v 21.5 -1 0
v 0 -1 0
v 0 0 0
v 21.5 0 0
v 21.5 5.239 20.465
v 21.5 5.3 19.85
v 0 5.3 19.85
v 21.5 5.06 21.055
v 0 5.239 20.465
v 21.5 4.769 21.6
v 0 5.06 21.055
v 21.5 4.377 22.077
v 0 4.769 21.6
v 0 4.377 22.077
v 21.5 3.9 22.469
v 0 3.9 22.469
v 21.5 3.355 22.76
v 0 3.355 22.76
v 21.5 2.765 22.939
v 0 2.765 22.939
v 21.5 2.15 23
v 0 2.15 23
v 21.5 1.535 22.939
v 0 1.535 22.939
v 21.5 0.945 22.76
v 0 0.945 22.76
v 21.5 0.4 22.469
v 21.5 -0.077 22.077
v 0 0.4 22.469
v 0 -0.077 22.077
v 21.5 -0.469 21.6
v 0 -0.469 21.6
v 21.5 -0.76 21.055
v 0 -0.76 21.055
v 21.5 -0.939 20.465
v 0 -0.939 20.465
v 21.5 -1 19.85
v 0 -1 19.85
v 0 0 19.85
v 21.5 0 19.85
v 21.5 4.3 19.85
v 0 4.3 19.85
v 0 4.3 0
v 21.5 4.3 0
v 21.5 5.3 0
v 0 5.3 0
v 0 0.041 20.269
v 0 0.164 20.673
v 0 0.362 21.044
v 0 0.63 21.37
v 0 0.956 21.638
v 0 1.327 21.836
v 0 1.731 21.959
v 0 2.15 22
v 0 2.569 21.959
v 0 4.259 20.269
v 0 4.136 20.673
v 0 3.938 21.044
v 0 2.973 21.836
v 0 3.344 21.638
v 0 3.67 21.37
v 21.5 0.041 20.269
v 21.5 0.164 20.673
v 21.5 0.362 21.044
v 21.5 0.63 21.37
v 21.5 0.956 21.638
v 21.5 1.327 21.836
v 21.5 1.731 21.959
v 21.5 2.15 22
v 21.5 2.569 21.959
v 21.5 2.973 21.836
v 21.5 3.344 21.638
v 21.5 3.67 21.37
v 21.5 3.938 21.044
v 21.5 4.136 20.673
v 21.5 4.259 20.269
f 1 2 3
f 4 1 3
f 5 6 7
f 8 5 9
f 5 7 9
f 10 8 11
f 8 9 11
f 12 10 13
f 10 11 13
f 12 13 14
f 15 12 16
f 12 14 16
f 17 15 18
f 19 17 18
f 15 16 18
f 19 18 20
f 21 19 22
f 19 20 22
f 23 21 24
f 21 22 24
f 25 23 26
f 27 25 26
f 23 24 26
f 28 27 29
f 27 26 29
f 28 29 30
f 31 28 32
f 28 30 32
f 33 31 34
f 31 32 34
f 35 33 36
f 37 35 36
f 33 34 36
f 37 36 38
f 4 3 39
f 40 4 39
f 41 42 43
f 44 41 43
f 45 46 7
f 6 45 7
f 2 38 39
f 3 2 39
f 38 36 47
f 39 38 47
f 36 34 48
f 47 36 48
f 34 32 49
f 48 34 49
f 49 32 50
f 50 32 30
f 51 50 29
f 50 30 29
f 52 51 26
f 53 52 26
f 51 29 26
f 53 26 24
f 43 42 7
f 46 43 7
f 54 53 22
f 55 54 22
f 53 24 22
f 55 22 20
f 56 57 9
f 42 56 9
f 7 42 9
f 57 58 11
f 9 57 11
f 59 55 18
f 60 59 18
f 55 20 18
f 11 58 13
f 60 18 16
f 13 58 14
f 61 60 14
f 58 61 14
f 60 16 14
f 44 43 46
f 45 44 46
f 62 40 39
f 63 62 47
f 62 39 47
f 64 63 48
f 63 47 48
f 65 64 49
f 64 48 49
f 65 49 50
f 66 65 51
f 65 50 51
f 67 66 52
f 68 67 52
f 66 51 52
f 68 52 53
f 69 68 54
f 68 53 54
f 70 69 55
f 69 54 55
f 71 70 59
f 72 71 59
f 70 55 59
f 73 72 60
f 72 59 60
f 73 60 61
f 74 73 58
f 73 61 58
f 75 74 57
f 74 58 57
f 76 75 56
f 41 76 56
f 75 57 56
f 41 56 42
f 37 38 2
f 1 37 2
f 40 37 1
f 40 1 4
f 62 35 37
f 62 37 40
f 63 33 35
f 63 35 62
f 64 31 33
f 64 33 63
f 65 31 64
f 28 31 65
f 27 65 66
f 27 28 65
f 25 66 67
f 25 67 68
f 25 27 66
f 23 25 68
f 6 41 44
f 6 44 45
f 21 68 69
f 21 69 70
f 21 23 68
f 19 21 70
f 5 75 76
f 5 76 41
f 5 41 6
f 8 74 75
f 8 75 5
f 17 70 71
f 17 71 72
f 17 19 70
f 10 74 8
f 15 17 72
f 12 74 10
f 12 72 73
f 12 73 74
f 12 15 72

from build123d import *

# Parameters (mm, degrees)
TABAN_FLAN_1_DEPTH = 21.5


# Sheet-metal steps are written as plain solids
with BuildPart() as part:
    # Çizim1 → Taban-Flanş1 (new body)
    with BuildSketch(Plane.YZ):
        with BuildLine():
            Line((0, 0), (0, 19.85))
            ThreePointArc((0, 19.85), (2.15, 22), (4.3, 19.85))
            Line((4.3, 19.85), (4.3, 0))
            Line((4.3, 0), (5.3, 0))
            Line((5.3, 0), (5.3, 19.85))
            ThreePointArc((5.3, 19.85), (2.15, 23), (-1, 19.85))
            Line((-1, 19.85), (-1, 0))
            Line((-1, 0), (0, 0))
        make_face()
    extrude(amount=TABAN_FLAN_1_DEPTH)


solid = part.part
